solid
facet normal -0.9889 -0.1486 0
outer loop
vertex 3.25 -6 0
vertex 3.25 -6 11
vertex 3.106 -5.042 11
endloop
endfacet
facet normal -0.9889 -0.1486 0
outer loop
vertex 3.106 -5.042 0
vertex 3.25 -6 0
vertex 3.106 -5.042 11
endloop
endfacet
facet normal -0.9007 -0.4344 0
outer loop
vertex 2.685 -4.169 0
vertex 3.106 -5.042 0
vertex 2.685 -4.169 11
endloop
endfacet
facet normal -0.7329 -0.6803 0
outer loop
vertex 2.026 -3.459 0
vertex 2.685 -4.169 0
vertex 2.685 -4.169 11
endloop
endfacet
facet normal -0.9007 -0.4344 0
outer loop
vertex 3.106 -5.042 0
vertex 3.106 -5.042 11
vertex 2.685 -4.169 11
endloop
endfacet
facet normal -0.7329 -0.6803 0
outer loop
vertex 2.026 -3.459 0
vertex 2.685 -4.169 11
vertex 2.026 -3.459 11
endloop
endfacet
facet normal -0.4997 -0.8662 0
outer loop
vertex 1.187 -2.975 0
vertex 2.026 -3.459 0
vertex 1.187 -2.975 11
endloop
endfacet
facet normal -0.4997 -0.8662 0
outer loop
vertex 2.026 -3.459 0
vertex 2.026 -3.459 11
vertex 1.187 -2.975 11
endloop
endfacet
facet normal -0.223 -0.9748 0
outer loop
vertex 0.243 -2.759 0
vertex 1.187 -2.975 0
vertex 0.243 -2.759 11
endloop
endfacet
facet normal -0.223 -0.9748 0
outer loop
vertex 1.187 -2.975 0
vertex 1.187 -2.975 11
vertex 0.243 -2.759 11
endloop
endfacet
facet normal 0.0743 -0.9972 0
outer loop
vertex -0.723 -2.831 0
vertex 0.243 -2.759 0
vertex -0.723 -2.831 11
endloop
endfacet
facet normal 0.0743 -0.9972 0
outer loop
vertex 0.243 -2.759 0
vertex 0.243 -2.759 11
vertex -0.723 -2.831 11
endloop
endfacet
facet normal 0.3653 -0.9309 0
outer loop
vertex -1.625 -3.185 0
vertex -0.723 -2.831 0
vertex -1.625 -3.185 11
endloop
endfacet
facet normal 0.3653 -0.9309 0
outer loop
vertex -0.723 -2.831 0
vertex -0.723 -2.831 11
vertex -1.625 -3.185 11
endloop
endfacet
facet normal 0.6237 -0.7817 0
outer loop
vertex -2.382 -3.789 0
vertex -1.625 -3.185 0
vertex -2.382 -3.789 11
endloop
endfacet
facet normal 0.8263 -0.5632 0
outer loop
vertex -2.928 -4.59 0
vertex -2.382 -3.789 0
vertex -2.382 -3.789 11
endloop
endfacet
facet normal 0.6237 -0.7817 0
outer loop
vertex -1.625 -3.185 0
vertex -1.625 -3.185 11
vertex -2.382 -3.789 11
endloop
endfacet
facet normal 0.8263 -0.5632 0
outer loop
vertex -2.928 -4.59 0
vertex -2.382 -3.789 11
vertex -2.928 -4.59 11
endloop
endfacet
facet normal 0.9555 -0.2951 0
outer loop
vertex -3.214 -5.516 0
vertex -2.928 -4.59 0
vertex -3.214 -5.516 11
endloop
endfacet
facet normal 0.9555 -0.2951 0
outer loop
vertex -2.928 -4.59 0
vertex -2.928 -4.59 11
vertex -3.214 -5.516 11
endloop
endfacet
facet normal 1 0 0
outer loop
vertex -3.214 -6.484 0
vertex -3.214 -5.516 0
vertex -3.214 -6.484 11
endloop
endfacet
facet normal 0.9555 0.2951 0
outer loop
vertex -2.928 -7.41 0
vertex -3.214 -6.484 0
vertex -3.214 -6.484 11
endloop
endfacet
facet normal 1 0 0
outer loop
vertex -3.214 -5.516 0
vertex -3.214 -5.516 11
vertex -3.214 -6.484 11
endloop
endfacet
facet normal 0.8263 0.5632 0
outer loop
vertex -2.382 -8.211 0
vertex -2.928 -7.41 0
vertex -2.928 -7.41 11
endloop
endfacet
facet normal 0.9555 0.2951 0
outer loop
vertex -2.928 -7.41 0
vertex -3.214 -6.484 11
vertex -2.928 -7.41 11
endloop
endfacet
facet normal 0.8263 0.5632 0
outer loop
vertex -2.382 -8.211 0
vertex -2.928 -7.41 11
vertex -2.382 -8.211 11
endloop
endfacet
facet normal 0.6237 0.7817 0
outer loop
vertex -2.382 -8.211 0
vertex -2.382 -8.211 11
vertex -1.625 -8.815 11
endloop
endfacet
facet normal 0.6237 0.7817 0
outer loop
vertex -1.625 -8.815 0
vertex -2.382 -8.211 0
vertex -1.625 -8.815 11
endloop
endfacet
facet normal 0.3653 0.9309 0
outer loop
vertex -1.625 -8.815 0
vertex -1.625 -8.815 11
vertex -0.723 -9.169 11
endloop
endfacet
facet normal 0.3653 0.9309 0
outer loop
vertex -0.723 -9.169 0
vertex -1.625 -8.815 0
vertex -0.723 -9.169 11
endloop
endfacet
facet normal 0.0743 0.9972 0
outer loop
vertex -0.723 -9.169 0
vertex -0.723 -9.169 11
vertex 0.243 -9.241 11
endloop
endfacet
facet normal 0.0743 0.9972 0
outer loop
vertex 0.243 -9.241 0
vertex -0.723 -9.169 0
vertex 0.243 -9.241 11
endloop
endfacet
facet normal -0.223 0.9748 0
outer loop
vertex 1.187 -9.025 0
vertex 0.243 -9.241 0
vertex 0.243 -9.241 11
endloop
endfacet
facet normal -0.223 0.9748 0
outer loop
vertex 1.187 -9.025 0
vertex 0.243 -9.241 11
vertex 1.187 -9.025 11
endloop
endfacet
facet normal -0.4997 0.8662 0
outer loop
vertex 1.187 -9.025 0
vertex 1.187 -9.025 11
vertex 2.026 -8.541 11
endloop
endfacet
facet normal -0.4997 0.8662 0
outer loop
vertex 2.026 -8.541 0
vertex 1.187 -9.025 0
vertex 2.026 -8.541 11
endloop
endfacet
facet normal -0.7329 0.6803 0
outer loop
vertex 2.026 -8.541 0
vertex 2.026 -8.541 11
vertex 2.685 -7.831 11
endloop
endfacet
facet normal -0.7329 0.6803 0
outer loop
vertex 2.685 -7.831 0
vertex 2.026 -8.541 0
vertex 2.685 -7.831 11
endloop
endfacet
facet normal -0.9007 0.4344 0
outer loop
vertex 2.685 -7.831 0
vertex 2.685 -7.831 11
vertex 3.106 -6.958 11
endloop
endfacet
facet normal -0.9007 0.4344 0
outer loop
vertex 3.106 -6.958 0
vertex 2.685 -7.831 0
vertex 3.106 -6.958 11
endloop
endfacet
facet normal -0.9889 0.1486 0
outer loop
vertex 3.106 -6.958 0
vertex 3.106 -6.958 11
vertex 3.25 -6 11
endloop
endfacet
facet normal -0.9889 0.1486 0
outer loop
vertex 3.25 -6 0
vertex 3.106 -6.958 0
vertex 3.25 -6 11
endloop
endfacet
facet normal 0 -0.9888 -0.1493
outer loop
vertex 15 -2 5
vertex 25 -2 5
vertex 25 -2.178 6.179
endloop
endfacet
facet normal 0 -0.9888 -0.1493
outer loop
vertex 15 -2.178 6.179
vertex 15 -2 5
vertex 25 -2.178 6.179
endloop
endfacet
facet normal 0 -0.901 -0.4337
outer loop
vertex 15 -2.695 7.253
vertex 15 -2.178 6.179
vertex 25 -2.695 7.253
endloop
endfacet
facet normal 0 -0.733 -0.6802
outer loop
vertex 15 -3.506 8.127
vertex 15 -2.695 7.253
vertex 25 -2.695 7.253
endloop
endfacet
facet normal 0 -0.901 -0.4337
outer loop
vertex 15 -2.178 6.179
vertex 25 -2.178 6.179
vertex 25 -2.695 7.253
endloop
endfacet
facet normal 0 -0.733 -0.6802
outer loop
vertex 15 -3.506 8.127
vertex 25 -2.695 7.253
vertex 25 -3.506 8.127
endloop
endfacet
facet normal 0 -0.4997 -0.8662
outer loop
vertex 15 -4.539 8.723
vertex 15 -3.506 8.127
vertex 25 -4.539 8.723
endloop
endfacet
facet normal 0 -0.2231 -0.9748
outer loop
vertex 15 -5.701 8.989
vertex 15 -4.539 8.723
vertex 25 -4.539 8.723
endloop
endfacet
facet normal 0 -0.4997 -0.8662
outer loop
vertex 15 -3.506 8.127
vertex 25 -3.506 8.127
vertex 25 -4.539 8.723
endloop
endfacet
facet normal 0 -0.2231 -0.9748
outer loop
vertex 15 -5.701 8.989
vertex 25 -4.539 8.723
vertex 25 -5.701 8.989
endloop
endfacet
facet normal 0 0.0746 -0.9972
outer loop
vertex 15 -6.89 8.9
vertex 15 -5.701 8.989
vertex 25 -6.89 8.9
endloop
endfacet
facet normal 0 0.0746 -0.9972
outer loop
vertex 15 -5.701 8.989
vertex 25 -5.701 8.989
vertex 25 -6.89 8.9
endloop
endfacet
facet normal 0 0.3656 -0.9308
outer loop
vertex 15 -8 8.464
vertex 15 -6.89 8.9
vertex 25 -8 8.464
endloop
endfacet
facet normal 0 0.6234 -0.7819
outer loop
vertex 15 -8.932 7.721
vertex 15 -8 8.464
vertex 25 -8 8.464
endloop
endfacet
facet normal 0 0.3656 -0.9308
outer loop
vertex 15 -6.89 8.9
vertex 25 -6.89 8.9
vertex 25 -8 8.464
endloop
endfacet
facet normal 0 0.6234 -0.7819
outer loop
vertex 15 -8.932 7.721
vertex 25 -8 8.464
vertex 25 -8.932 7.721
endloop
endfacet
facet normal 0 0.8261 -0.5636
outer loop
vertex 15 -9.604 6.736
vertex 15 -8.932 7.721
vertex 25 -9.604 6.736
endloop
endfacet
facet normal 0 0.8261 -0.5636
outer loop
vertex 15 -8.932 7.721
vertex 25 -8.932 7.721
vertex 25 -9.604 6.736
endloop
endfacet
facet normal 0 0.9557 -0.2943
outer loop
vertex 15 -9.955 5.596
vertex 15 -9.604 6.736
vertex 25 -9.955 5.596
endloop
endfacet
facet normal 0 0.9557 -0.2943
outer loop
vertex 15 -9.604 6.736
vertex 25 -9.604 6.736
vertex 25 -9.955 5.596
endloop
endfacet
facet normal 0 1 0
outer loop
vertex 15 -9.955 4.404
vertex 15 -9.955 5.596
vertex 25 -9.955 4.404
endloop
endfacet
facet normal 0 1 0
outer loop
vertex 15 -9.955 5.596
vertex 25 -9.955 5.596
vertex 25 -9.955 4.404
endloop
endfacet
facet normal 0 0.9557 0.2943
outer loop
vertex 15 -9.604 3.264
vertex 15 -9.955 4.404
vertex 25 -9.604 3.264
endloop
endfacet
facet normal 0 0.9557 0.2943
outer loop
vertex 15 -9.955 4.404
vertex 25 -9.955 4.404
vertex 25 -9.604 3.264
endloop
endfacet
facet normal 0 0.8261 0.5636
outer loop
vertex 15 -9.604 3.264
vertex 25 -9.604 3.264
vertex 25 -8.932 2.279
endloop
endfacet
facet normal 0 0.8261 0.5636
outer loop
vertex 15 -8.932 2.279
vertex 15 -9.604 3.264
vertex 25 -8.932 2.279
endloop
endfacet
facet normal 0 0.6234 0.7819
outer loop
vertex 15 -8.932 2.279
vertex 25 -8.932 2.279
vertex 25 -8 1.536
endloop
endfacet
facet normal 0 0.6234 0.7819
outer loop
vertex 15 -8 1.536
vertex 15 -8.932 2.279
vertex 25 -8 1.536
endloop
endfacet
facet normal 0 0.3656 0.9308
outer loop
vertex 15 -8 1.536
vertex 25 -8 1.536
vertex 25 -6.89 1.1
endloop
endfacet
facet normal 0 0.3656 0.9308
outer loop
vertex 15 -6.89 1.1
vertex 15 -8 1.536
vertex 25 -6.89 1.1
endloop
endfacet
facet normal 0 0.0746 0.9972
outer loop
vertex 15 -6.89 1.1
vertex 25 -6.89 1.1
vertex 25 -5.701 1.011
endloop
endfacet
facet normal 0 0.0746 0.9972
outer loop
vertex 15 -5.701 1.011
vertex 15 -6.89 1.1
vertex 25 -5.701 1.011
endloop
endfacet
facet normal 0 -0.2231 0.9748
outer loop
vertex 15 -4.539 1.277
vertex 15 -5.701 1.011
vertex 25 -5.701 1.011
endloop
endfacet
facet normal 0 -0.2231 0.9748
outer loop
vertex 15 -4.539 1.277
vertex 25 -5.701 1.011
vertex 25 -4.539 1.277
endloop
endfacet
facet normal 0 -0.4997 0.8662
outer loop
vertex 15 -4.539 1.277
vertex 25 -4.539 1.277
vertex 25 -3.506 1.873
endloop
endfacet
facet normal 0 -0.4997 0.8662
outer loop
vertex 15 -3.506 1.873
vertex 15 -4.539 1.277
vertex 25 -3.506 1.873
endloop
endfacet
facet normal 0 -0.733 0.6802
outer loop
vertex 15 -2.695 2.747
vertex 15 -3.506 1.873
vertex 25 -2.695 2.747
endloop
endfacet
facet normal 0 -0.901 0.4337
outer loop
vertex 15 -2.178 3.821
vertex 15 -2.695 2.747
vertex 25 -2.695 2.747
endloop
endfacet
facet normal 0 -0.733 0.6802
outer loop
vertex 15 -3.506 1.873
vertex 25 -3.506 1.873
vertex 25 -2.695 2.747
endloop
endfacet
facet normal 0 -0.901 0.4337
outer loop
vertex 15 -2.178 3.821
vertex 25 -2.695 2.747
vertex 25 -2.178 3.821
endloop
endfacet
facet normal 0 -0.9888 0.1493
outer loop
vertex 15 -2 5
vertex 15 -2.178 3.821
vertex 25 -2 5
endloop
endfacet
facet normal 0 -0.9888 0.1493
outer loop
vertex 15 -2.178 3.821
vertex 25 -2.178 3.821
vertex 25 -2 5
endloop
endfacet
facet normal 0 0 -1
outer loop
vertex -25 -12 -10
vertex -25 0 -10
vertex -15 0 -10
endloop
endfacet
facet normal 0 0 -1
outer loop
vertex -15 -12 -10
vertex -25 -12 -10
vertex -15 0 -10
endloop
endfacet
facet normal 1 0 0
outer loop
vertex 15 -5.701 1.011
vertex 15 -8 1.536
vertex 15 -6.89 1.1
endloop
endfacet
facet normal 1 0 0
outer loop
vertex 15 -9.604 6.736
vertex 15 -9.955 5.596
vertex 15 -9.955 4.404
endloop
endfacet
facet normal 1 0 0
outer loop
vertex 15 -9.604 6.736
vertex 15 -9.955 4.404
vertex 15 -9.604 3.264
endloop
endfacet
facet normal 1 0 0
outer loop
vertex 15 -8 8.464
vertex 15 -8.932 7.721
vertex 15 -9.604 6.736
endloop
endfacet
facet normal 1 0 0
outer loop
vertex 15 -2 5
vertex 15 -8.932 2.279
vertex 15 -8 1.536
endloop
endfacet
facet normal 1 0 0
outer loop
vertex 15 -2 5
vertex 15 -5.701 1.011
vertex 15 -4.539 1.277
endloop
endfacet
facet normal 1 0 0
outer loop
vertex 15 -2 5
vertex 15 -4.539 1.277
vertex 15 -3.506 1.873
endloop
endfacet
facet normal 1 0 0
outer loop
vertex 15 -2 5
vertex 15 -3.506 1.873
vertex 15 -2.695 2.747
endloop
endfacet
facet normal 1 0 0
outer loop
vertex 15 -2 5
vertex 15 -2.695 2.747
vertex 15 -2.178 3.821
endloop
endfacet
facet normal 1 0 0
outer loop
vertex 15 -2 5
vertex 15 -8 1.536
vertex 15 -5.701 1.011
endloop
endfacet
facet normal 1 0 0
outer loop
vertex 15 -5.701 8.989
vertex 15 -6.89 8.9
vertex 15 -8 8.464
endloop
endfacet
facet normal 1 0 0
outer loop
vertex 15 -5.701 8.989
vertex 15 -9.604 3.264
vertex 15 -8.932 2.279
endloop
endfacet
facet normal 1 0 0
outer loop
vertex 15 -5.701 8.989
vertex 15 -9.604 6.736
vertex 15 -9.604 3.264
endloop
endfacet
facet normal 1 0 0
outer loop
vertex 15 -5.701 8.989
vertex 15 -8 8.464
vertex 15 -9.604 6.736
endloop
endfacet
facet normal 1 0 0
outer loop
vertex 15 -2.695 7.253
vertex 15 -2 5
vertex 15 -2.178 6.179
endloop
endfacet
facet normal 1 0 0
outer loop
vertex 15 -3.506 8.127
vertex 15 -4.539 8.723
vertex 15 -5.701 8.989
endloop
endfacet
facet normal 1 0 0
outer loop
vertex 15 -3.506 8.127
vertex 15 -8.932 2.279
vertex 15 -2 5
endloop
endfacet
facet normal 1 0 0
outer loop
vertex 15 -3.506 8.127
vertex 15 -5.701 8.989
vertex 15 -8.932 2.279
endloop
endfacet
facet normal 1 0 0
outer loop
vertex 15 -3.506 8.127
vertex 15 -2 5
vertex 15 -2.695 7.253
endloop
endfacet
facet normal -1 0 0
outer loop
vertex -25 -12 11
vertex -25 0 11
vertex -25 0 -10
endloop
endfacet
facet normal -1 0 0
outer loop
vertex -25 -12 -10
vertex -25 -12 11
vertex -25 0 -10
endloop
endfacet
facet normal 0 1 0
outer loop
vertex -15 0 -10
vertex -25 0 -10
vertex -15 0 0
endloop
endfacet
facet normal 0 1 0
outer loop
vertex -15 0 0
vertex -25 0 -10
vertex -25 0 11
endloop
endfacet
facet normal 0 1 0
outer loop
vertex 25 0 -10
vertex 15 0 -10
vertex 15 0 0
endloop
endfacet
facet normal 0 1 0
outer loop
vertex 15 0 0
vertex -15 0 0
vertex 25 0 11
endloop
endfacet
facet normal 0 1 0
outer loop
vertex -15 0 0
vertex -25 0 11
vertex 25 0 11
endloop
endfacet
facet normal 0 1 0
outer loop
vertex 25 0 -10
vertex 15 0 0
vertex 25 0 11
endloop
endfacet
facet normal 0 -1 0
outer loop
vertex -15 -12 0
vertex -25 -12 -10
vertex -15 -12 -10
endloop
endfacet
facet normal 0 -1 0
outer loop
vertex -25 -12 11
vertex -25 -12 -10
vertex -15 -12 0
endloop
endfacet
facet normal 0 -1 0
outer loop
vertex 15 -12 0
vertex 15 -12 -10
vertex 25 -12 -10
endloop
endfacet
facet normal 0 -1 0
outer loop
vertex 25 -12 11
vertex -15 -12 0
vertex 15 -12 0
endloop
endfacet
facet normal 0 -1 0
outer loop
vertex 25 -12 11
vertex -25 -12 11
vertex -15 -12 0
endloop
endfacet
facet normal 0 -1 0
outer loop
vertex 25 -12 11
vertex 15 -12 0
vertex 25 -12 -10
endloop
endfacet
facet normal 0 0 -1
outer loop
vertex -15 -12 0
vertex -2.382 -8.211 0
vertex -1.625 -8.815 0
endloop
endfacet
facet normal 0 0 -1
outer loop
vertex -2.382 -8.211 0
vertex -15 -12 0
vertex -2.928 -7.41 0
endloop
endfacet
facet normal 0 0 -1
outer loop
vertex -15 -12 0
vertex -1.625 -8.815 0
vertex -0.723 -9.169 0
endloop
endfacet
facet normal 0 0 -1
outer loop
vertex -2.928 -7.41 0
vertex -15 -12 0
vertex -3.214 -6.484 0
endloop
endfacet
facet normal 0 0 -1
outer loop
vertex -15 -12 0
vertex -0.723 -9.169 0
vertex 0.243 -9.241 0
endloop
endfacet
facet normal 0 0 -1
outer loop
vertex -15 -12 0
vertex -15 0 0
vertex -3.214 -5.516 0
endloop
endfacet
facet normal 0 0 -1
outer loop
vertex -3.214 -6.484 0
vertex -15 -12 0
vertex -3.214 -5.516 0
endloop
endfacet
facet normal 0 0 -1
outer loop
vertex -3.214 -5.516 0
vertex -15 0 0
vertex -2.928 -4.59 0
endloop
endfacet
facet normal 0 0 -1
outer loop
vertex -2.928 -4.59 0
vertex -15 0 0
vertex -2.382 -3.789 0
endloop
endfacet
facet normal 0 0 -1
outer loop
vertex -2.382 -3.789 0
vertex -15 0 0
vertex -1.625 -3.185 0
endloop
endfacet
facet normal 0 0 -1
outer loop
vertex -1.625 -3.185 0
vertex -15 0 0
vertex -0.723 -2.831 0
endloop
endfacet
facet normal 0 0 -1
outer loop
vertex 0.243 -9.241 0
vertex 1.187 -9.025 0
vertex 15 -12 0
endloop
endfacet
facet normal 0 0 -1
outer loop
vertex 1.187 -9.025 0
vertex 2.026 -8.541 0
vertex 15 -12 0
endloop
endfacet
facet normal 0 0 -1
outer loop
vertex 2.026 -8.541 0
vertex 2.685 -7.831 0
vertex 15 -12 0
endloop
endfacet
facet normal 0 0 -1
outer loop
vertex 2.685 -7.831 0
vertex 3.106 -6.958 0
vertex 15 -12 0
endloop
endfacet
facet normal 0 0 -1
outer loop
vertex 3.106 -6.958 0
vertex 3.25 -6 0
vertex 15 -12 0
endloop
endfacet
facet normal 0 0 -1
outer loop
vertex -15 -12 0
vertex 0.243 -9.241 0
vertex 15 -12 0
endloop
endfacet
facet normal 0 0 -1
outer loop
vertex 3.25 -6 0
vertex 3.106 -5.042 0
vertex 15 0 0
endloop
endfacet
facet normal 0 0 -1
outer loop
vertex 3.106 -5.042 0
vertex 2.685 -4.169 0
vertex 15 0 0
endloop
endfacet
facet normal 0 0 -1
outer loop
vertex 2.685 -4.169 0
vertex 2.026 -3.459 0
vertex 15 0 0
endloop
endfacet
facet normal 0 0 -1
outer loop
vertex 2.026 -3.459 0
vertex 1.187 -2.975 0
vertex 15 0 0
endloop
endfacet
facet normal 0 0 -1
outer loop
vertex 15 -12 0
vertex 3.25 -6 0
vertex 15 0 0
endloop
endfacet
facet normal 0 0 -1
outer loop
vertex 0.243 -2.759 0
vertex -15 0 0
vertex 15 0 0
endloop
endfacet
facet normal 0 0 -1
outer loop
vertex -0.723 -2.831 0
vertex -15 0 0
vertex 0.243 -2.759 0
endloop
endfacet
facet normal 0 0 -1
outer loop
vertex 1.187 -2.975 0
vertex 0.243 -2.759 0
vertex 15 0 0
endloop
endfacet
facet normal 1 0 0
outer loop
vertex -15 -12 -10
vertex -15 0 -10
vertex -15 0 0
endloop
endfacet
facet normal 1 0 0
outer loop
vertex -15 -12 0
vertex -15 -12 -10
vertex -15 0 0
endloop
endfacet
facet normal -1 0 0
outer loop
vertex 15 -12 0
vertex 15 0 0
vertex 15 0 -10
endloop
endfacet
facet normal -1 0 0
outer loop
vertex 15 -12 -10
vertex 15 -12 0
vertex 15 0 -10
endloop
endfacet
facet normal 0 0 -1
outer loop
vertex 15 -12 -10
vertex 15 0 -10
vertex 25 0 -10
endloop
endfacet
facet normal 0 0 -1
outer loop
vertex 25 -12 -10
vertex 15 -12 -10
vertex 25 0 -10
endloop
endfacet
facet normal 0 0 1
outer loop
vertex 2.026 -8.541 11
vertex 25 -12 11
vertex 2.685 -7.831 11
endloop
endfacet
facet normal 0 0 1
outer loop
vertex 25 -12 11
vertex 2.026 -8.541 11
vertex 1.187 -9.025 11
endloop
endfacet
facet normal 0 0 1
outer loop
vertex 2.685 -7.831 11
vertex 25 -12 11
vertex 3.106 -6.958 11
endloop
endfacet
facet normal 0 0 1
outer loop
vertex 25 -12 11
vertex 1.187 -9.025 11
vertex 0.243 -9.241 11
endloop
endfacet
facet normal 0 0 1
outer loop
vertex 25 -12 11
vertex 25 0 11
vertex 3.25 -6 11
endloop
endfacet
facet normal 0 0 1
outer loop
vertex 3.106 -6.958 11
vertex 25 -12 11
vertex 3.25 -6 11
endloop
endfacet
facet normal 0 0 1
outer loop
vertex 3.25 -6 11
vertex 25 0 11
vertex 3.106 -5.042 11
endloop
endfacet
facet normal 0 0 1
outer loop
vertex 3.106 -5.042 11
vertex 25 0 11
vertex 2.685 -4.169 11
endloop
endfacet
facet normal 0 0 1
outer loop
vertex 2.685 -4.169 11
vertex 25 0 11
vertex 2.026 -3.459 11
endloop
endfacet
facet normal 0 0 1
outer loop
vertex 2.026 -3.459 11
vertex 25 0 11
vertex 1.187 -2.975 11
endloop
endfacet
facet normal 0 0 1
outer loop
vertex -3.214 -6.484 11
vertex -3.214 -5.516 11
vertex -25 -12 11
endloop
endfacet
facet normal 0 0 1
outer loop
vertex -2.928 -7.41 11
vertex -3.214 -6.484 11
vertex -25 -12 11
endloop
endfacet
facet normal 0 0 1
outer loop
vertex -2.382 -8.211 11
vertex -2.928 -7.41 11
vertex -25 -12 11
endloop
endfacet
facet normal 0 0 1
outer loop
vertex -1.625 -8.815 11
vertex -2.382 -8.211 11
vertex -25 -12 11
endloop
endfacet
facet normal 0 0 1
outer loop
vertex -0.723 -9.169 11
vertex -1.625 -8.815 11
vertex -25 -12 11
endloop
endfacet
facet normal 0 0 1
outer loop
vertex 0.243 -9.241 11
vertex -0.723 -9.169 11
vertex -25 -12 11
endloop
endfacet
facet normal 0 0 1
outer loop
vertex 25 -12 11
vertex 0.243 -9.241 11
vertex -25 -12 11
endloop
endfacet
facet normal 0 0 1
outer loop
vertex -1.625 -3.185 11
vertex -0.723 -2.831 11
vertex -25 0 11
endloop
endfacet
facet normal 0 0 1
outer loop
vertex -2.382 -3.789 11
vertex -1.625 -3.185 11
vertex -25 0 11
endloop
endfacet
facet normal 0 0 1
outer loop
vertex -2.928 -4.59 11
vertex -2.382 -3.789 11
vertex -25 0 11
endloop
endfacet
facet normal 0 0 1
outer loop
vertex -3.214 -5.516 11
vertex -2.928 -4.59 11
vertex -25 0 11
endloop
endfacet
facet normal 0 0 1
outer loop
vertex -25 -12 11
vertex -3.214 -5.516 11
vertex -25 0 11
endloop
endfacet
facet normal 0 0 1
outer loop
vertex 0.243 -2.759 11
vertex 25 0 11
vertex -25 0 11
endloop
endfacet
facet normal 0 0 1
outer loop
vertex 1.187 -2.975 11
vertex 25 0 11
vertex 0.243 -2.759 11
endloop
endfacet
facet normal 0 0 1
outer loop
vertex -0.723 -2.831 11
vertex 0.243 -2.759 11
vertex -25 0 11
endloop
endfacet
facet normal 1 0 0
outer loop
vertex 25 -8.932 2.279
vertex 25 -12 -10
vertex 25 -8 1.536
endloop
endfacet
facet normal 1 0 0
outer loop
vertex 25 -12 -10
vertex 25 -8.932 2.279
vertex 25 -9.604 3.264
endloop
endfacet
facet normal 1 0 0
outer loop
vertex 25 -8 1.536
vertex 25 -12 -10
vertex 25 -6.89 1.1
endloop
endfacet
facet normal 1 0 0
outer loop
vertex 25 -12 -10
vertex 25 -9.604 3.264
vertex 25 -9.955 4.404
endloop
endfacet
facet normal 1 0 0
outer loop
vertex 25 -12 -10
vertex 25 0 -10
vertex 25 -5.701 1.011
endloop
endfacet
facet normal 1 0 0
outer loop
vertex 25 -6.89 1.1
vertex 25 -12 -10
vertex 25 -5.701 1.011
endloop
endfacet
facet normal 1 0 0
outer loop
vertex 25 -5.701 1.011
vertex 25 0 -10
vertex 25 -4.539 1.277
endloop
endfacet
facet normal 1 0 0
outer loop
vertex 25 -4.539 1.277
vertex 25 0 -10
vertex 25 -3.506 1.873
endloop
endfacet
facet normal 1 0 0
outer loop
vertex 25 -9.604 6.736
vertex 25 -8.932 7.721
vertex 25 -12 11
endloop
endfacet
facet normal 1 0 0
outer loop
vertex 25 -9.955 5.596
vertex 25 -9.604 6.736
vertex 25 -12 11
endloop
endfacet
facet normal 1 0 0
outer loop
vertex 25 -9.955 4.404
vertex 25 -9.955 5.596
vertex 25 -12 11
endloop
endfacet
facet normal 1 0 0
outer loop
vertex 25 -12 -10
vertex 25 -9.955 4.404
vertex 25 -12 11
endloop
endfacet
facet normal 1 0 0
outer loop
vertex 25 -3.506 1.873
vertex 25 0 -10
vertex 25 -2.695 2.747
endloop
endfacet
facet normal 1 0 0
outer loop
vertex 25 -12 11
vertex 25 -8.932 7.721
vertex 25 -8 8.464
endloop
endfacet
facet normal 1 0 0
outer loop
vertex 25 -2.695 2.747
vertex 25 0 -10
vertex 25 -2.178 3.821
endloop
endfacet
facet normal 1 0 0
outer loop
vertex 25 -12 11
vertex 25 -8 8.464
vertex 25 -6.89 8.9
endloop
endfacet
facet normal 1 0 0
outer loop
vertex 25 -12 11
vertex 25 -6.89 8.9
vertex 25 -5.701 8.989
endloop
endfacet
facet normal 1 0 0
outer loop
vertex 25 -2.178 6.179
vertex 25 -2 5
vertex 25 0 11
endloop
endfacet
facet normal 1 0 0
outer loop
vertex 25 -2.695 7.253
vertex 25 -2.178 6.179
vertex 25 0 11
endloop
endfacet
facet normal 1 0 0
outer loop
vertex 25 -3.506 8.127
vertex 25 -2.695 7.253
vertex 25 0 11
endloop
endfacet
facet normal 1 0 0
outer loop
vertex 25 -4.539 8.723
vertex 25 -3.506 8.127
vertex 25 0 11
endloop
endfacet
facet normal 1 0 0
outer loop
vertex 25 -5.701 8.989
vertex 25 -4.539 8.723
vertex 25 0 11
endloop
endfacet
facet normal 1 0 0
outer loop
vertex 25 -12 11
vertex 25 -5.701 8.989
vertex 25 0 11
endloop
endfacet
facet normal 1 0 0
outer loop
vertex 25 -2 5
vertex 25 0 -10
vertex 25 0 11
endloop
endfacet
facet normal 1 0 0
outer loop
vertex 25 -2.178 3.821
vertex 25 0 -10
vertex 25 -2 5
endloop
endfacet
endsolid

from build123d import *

# Parameters (mm, degrees)
F1_DEPTH = 12
F2_R     = 4
F3_DEPTH = 10
F4_R     = 3.25
F5_DEPTH = 21.001


with BuildPart() as f1:
    # F0 (on Front) → F1 (new body)
    with BuildSketch(Plane.XZ):
        Polygon((-15, 0), (0, 0), (15, 0), (15, -10), (25, -10), (25, 11), (0, 11), (-25, 11), (-25, -10), (-15, -10), align=None)
    extrude(amount=F1_DEPTH)

    # F2 (on face) → F3 (cut)
    with BuildSketch(Plane.YZ.offset(25)):
        with Locations((-6, 5)):
            Circle(F2_R)
    extrude(amount=-F3_DEPTH, mode=Mode.SUBTRACT)

    # F4 (on face) → F5 (cut, through all)
    with BuildSketch(Plane.XY.offset(11)):
        with Locations((0, -6)):
            Circle(F4_R)
    extrude(amount=-F5_DEPTH, mode=Mode.SUBTRACT)


solid = f1.part
